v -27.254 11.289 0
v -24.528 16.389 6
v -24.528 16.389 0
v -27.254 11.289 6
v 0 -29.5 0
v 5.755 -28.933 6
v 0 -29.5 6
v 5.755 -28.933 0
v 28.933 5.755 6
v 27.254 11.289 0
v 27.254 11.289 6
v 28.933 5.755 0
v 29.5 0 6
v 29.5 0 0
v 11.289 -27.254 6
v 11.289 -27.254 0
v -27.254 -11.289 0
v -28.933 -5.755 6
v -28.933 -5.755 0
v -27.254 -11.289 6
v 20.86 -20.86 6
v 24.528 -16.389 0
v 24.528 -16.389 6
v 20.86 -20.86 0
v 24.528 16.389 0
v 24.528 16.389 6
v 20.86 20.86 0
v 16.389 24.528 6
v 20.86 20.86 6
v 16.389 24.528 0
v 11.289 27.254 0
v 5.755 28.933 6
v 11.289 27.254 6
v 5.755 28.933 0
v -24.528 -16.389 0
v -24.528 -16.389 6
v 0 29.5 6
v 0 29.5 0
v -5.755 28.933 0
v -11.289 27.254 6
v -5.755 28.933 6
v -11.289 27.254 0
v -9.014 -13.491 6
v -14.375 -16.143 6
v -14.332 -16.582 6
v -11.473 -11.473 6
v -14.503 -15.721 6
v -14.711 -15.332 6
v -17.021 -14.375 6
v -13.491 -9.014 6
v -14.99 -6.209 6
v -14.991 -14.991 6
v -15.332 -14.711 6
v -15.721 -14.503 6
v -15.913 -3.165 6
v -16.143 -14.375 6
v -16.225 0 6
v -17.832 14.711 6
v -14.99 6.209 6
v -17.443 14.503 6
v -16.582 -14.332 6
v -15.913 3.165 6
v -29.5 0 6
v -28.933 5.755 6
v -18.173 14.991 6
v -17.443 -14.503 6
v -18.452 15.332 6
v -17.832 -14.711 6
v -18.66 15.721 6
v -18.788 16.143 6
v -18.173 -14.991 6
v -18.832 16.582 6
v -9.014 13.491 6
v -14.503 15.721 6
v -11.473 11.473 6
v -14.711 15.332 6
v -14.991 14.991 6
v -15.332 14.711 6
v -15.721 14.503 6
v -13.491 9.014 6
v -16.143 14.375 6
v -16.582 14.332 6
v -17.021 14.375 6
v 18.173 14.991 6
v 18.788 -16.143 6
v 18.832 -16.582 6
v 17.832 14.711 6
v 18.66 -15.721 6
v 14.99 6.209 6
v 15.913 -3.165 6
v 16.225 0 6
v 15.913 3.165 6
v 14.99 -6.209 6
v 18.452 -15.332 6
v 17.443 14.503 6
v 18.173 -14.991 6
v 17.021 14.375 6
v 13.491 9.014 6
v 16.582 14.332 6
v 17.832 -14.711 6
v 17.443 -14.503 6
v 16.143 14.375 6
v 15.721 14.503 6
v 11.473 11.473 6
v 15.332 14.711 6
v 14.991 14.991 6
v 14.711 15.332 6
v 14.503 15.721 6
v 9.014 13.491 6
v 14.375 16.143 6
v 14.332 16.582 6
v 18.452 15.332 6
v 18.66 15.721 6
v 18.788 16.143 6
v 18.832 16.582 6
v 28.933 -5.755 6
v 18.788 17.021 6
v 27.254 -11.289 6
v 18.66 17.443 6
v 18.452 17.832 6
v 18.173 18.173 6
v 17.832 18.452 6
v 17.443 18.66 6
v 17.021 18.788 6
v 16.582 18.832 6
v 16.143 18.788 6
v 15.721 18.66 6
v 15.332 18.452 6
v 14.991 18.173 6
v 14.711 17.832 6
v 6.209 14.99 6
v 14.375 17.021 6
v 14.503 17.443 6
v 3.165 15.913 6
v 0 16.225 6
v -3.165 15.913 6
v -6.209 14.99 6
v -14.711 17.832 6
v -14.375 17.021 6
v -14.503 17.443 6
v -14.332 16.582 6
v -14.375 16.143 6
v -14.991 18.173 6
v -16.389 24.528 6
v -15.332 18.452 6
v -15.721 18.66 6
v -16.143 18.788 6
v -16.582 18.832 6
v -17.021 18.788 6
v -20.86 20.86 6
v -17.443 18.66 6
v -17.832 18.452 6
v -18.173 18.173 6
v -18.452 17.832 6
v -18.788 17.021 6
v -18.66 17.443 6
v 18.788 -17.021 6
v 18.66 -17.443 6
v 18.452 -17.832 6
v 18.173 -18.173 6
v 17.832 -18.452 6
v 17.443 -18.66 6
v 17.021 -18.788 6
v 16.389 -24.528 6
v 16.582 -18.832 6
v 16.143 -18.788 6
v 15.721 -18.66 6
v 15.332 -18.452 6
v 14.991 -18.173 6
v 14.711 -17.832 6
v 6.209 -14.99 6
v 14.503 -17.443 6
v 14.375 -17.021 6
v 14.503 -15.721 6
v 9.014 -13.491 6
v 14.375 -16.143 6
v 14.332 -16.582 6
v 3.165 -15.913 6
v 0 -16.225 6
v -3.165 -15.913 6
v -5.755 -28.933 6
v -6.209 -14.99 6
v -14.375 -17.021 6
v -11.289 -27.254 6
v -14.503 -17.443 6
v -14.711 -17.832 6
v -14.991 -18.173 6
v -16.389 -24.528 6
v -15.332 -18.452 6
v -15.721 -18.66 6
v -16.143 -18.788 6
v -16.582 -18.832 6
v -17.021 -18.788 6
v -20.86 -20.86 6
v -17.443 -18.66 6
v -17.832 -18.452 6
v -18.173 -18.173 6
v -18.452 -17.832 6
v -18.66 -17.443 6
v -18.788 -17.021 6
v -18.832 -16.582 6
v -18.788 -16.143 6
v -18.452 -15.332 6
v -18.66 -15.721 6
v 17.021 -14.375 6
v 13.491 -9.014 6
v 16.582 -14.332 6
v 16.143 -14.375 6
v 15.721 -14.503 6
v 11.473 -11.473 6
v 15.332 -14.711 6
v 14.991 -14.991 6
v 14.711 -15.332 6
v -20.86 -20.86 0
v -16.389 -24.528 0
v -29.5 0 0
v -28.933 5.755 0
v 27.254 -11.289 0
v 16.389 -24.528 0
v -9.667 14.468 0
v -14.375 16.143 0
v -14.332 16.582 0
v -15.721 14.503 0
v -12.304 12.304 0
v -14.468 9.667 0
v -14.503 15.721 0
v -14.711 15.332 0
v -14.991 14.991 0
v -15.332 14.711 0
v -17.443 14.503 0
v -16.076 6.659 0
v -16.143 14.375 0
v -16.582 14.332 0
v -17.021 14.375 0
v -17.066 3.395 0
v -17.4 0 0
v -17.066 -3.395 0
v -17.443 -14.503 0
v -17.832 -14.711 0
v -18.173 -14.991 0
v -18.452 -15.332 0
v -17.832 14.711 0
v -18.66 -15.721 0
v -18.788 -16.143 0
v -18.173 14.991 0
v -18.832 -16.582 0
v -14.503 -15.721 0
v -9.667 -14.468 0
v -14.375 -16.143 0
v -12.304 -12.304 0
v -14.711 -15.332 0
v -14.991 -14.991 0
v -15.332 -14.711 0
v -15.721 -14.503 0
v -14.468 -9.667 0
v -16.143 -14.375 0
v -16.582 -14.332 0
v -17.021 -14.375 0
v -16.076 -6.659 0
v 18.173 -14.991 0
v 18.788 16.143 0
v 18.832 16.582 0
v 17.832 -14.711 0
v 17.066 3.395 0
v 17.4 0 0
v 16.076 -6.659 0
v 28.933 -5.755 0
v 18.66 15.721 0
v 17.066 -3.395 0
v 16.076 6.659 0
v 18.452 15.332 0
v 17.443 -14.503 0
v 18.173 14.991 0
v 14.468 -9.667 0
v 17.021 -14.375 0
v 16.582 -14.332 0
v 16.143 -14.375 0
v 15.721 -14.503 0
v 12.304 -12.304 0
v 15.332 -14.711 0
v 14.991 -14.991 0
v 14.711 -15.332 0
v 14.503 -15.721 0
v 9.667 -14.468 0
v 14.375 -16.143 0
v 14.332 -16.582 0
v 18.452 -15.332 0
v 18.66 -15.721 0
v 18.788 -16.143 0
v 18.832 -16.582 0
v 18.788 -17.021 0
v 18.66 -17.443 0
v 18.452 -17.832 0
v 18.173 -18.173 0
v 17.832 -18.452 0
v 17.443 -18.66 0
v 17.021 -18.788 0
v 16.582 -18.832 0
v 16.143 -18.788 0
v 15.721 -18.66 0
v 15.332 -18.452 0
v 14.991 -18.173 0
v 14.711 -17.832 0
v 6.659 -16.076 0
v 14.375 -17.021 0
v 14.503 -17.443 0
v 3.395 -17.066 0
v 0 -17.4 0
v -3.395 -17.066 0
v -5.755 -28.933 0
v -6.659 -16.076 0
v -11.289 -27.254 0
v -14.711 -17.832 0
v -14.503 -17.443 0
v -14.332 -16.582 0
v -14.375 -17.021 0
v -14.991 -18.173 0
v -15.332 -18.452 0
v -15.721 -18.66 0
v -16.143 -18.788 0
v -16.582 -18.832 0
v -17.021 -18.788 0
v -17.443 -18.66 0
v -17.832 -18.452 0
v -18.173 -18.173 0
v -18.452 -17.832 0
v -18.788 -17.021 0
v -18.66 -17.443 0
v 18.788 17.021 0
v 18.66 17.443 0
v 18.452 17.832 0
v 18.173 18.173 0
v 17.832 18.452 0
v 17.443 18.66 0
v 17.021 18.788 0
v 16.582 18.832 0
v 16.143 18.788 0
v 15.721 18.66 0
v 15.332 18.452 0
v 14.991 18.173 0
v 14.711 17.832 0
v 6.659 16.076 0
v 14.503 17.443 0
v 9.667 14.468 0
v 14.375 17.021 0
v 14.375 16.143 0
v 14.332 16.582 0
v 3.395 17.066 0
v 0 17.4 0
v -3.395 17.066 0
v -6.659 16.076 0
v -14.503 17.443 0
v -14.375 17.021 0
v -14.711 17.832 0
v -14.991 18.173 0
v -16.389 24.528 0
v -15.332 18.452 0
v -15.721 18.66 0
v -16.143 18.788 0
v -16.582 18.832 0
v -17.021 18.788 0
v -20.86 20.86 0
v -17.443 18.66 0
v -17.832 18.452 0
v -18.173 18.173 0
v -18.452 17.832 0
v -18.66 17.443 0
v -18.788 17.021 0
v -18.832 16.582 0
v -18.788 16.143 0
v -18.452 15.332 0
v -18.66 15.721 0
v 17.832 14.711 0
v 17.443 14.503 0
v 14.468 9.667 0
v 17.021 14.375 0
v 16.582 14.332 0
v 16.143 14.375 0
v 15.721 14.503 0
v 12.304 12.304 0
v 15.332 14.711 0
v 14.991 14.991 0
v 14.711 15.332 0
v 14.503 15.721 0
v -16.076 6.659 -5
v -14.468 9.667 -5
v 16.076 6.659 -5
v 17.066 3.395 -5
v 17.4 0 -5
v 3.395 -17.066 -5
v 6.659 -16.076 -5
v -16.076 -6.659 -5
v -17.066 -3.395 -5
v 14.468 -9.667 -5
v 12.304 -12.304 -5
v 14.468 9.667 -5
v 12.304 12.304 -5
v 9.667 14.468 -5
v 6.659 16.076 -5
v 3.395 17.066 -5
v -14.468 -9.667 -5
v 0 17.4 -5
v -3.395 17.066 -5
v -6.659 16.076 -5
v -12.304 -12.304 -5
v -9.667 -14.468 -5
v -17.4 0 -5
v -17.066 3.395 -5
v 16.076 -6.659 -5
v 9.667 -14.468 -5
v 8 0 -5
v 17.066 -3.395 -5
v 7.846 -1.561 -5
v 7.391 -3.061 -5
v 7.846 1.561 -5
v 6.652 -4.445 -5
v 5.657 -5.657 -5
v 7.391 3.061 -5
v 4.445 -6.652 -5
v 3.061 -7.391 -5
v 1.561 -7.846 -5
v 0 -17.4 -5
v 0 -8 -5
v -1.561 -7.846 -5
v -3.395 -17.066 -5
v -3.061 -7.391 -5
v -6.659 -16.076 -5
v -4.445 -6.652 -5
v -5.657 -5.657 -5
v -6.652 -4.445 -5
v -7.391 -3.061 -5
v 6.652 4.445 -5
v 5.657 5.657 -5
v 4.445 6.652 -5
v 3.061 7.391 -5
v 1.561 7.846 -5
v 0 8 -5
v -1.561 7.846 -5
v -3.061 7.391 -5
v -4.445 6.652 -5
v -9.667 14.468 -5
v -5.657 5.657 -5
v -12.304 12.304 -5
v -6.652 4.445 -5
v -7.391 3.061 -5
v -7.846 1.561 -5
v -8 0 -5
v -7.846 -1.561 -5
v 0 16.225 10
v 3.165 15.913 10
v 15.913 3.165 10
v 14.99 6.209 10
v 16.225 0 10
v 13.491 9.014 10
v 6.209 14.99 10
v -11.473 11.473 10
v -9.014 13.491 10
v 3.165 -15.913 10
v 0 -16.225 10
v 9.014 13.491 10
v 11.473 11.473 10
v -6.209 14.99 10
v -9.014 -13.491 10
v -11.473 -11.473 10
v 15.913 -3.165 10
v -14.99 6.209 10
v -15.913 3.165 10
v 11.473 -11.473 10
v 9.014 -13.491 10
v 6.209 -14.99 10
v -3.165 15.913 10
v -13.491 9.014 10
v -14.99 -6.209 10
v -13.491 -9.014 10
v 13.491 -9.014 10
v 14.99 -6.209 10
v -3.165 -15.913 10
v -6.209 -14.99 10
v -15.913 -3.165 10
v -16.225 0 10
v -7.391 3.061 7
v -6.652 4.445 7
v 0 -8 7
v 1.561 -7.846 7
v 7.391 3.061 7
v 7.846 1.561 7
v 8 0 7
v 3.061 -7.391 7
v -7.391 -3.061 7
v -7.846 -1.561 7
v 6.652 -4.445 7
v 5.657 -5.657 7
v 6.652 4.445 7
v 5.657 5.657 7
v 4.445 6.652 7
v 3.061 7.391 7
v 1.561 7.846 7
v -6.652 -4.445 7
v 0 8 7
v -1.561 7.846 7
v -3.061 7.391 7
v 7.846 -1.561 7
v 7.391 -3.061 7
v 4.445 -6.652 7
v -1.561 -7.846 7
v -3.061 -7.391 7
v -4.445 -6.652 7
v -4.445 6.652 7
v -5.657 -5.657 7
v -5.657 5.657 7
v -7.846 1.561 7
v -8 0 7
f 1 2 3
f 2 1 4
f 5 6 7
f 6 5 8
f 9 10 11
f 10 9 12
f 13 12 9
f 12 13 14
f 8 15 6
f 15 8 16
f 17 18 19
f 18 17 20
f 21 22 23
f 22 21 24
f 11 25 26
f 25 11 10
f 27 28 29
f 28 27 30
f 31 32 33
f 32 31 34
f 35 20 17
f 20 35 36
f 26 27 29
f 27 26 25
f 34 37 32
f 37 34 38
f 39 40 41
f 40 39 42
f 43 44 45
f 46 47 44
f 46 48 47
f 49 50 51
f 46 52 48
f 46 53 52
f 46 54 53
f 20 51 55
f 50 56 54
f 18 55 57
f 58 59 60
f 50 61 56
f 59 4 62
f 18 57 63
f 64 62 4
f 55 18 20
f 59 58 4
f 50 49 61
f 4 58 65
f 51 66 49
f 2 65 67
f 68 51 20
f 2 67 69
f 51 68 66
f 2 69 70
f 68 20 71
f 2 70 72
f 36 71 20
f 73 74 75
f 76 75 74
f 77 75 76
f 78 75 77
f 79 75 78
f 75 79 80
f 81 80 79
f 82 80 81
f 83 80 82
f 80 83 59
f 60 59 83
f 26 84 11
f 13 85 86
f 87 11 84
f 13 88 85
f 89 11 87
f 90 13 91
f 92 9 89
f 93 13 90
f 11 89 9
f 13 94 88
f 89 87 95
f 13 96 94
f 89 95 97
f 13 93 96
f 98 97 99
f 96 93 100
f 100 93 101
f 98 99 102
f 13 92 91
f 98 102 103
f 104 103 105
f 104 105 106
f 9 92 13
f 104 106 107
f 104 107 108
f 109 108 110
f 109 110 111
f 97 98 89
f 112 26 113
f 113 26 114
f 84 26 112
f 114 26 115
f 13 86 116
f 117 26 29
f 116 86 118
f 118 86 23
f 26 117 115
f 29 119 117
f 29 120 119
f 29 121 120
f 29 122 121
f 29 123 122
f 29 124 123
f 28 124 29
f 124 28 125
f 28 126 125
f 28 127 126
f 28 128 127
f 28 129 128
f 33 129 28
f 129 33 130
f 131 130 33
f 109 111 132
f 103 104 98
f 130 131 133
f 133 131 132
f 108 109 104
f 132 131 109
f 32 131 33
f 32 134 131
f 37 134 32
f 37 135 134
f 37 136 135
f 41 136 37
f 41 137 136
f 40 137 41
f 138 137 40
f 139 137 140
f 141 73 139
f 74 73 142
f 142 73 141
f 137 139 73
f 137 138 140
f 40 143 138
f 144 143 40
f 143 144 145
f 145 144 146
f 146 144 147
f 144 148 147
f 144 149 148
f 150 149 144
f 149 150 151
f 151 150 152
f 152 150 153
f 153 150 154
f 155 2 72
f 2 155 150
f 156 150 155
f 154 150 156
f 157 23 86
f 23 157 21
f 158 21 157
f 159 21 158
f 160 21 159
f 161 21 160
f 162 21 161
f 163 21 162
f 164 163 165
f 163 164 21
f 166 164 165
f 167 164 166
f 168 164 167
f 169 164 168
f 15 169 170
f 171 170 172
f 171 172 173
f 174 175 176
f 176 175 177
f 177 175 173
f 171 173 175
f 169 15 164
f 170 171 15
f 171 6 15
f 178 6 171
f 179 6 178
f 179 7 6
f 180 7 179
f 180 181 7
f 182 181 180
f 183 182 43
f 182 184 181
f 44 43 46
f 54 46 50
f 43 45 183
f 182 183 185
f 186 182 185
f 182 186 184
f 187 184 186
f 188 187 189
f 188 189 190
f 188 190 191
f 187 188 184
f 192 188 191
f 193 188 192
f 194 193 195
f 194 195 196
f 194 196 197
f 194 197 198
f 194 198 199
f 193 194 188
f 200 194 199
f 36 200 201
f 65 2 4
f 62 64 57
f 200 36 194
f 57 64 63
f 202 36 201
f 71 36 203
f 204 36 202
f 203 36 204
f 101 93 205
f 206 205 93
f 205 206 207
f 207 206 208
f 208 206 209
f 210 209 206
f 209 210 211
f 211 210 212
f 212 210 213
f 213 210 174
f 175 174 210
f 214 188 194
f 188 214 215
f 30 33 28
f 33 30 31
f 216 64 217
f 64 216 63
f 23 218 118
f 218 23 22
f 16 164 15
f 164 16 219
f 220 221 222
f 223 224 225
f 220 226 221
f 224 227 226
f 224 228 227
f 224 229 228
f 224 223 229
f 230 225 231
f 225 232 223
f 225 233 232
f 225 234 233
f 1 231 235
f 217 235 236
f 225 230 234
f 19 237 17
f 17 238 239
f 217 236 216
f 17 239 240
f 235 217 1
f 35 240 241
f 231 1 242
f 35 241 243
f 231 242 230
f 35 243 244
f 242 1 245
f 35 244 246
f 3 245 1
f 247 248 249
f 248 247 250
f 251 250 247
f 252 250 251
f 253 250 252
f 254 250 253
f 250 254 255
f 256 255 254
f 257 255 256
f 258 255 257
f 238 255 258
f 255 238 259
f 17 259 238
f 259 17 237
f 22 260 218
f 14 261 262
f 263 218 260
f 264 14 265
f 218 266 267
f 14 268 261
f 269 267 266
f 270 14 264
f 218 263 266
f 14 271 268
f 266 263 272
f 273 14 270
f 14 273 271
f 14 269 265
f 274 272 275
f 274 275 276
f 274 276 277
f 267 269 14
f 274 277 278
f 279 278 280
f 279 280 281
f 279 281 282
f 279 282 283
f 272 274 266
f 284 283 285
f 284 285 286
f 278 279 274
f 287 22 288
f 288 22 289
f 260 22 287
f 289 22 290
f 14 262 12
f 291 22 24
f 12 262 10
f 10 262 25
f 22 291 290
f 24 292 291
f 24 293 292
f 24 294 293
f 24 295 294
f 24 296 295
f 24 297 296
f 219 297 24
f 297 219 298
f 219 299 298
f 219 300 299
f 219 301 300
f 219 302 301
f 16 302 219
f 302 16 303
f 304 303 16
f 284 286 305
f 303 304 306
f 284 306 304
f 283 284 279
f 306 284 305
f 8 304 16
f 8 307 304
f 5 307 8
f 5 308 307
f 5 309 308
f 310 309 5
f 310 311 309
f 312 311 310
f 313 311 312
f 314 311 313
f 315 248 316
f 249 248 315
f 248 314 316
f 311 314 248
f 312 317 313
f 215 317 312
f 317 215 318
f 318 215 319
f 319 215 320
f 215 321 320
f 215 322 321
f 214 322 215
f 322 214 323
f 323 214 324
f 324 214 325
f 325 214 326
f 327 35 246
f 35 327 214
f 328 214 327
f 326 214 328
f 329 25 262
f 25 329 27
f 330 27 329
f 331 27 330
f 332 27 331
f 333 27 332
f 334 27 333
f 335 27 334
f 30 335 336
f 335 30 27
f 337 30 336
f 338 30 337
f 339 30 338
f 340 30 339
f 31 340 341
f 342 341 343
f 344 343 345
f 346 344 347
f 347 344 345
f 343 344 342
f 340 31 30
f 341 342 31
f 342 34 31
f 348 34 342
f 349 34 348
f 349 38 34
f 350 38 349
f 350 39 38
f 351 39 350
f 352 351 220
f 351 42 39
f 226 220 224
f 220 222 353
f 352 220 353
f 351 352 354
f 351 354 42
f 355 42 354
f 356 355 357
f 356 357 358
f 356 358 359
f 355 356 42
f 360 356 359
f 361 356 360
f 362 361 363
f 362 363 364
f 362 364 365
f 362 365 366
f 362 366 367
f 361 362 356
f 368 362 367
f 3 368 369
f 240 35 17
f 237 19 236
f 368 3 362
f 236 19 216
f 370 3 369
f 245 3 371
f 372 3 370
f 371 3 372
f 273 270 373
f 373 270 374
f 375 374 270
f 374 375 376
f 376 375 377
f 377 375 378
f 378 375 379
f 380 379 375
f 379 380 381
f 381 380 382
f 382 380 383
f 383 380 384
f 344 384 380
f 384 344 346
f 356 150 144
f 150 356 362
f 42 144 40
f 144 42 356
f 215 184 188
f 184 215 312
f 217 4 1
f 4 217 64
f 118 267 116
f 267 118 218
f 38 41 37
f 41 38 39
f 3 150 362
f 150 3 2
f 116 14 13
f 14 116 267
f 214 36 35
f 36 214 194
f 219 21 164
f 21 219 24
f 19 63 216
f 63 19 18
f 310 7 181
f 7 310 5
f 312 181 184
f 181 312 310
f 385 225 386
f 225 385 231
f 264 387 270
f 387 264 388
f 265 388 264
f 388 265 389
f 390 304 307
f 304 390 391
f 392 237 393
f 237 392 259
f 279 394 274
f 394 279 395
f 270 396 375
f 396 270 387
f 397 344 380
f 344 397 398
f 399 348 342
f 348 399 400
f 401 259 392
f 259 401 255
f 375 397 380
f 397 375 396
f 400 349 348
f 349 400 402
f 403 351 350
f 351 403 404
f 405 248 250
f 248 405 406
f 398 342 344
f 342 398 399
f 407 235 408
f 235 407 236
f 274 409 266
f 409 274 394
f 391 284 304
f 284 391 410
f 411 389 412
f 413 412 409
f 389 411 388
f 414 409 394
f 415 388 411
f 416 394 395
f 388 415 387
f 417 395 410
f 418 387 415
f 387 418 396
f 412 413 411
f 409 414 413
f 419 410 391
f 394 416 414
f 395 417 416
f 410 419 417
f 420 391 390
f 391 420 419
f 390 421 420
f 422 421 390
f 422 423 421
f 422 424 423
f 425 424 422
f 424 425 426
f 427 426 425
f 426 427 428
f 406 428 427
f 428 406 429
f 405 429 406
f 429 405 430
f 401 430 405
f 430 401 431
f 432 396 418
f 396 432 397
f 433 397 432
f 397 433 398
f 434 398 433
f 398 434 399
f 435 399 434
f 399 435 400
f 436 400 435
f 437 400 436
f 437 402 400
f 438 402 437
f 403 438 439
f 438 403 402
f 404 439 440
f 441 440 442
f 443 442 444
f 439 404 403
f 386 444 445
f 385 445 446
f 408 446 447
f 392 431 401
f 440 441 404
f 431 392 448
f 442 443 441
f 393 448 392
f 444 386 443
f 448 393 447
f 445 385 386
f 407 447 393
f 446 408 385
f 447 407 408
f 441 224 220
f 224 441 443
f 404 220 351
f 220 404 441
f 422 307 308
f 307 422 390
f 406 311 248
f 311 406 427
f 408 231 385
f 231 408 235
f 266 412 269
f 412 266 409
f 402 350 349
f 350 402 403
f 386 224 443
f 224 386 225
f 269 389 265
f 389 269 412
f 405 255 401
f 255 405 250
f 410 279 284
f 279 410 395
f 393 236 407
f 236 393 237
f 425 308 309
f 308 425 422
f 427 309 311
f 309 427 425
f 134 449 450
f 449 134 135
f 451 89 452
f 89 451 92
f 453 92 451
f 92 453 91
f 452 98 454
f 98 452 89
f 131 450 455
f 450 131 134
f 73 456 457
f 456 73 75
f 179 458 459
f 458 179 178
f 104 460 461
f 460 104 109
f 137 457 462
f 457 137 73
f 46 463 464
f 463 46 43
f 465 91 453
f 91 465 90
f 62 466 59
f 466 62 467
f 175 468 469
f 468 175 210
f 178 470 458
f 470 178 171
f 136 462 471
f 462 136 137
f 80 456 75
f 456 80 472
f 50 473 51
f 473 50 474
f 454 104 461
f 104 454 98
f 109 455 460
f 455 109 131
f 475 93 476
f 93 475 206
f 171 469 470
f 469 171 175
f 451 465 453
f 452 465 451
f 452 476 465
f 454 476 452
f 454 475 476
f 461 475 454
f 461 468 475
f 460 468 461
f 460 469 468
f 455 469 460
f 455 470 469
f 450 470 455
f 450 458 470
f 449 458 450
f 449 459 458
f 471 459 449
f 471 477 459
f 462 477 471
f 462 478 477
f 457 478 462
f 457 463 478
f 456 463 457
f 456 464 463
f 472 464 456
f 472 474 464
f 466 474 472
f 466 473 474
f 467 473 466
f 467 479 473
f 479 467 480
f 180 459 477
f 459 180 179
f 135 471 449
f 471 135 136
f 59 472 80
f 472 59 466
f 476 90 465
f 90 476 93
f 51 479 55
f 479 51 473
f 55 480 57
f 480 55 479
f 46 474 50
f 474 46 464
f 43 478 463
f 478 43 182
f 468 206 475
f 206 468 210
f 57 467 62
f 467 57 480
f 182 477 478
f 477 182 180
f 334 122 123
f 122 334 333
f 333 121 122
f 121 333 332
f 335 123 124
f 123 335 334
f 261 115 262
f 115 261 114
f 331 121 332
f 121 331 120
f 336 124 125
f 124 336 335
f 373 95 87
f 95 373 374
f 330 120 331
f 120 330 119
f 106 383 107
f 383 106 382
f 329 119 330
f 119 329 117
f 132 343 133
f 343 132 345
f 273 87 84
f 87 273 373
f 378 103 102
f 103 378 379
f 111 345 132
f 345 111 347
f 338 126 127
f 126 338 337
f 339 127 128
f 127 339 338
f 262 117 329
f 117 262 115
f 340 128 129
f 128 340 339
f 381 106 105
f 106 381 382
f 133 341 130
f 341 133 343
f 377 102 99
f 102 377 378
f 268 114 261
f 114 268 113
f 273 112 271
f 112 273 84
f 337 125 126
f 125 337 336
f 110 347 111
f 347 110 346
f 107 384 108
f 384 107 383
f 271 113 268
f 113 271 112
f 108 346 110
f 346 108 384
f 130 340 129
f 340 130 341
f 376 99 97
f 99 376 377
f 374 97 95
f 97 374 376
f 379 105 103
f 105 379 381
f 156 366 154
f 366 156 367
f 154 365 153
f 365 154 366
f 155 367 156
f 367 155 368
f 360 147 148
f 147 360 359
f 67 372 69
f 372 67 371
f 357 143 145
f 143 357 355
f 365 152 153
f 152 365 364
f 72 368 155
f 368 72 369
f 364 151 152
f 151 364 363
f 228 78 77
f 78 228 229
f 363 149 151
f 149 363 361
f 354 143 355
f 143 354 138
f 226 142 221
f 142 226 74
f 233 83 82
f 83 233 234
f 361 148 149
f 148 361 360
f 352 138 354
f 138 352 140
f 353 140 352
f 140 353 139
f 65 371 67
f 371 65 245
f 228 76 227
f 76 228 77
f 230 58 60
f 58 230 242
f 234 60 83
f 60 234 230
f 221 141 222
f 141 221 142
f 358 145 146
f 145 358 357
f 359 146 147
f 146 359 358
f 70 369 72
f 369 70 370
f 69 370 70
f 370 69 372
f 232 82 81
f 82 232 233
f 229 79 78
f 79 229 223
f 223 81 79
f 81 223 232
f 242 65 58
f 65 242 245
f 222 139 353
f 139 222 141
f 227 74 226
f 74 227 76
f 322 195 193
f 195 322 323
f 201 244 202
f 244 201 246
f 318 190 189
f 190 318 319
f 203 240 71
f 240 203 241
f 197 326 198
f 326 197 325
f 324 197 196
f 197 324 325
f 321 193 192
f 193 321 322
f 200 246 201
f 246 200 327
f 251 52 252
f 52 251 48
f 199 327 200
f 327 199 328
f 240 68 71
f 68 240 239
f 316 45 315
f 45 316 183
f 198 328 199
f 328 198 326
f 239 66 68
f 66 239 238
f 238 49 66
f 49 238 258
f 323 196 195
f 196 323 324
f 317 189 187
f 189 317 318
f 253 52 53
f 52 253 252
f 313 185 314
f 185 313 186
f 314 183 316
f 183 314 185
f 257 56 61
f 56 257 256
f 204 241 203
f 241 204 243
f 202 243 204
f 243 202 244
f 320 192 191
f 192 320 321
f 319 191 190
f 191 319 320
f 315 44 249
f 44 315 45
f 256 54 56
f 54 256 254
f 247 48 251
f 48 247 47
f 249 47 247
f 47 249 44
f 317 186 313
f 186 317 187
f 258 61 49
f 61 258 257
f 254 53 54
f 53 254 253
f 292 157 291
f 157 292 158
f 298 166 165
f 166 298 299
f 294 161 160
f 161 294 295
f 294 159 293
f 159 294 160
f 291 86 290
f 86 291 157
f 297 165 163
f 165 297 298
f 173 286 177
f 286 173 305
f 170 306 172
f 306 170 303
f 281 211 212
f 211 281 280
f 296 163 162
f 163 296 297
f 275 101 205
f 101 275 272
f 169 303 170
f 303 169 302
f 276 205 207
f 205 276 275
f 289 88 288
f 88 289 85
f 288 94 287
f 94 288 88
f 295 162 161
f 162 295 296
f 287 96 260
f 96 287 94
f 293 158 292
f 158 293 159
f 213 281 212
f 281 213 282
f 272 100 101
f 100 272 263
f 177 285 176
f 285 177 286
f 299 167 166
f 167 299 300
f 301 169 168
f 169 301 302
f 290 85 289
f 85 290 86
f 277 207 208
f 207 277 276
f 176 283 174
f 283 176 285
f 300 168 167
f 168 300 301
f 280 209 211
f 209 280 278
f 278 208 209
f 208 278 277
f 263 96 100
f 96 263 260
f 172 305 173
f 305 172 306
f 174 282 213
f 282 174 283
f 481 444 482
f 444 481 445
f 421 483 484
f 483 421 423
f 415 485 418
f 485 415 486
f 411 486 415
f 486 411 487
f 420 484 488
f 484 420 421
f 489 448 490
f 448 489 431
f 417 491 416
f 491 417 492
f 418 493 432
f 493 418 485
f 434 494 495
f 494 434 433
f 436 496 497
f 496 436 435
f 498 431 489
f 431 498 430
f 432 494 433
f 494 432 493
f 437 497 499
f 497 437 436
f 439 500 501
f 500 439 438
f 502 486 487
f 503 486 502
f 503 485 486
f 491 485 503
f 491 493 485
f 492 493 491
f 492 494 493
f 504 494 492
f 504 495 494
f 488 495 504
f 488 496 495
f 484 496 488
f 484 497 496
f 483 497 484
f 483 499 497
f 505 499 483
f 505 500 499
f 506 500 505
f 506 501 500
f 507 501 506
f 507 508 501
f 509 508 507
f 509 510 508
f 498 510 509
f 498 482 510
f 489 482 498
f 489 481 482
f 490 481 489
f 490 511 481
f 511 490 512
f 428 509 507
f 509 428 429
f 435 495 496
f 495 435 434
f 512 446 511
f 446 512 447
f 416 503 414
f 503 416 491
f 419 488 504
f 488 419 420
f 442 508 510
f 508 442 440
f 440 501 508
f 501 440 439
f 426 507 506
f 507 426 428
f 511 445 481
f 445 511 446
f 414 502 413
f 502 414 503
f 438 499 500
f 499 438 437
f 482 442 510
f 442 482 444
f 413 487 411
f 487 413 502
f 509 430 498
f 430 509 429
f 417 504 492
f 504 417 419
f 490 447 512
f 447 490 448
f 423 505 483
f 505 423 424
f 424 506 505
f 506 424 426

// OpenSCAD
$fn = 32;

// ----------------------------------------------------------------------
// Retaining cap: 6202 cover, 59 mm, spigot 34.8 mm
// ----------------------------------------------------------------------

// --- parameters (mm) ---
cap_d = 59;               // cover diameter
cap_t = 6;                // cover thickness
lip_d = 34.8;             // spigot that enters the housing
lip_h = 5;                // spigot height
shaft_d = 16;             // shaft opening
bolt_d = 4.5;             // bolt clearance
bolt_r = 23.45;           // bolt circle radius
dome_h = 4;               // raised centre

module cover() {
  cylinder(h = cap_t, d = cap_d);
}

module spigot() {
  /* sunk 1 mm into the cover; the spigot sets the overall height */
  translate([0, 0, -lip_h]) cylinder(h = lip_h + 1, d = lip_d);
}

module dome() {
  translate([0, 0, cap_t - 1]) cylinder(h = dome_h + 1, d = cap_d * 0.55);
}

difference() {
  union() {
    cover();
    spigot();
    dome();
  }
  for (i = [0 : 3]) rotate([0, 0, 45 + i * 90]) translate([bolt_r, 0, -lip_h - 1])
    cylinder(h = lip_h + cap_t + 2, d = bolt_d);
  translate([0, 0, -lip_h - 1]) cylinder(h = lip_h + cap_t + 2, d = shaft_d);
}
